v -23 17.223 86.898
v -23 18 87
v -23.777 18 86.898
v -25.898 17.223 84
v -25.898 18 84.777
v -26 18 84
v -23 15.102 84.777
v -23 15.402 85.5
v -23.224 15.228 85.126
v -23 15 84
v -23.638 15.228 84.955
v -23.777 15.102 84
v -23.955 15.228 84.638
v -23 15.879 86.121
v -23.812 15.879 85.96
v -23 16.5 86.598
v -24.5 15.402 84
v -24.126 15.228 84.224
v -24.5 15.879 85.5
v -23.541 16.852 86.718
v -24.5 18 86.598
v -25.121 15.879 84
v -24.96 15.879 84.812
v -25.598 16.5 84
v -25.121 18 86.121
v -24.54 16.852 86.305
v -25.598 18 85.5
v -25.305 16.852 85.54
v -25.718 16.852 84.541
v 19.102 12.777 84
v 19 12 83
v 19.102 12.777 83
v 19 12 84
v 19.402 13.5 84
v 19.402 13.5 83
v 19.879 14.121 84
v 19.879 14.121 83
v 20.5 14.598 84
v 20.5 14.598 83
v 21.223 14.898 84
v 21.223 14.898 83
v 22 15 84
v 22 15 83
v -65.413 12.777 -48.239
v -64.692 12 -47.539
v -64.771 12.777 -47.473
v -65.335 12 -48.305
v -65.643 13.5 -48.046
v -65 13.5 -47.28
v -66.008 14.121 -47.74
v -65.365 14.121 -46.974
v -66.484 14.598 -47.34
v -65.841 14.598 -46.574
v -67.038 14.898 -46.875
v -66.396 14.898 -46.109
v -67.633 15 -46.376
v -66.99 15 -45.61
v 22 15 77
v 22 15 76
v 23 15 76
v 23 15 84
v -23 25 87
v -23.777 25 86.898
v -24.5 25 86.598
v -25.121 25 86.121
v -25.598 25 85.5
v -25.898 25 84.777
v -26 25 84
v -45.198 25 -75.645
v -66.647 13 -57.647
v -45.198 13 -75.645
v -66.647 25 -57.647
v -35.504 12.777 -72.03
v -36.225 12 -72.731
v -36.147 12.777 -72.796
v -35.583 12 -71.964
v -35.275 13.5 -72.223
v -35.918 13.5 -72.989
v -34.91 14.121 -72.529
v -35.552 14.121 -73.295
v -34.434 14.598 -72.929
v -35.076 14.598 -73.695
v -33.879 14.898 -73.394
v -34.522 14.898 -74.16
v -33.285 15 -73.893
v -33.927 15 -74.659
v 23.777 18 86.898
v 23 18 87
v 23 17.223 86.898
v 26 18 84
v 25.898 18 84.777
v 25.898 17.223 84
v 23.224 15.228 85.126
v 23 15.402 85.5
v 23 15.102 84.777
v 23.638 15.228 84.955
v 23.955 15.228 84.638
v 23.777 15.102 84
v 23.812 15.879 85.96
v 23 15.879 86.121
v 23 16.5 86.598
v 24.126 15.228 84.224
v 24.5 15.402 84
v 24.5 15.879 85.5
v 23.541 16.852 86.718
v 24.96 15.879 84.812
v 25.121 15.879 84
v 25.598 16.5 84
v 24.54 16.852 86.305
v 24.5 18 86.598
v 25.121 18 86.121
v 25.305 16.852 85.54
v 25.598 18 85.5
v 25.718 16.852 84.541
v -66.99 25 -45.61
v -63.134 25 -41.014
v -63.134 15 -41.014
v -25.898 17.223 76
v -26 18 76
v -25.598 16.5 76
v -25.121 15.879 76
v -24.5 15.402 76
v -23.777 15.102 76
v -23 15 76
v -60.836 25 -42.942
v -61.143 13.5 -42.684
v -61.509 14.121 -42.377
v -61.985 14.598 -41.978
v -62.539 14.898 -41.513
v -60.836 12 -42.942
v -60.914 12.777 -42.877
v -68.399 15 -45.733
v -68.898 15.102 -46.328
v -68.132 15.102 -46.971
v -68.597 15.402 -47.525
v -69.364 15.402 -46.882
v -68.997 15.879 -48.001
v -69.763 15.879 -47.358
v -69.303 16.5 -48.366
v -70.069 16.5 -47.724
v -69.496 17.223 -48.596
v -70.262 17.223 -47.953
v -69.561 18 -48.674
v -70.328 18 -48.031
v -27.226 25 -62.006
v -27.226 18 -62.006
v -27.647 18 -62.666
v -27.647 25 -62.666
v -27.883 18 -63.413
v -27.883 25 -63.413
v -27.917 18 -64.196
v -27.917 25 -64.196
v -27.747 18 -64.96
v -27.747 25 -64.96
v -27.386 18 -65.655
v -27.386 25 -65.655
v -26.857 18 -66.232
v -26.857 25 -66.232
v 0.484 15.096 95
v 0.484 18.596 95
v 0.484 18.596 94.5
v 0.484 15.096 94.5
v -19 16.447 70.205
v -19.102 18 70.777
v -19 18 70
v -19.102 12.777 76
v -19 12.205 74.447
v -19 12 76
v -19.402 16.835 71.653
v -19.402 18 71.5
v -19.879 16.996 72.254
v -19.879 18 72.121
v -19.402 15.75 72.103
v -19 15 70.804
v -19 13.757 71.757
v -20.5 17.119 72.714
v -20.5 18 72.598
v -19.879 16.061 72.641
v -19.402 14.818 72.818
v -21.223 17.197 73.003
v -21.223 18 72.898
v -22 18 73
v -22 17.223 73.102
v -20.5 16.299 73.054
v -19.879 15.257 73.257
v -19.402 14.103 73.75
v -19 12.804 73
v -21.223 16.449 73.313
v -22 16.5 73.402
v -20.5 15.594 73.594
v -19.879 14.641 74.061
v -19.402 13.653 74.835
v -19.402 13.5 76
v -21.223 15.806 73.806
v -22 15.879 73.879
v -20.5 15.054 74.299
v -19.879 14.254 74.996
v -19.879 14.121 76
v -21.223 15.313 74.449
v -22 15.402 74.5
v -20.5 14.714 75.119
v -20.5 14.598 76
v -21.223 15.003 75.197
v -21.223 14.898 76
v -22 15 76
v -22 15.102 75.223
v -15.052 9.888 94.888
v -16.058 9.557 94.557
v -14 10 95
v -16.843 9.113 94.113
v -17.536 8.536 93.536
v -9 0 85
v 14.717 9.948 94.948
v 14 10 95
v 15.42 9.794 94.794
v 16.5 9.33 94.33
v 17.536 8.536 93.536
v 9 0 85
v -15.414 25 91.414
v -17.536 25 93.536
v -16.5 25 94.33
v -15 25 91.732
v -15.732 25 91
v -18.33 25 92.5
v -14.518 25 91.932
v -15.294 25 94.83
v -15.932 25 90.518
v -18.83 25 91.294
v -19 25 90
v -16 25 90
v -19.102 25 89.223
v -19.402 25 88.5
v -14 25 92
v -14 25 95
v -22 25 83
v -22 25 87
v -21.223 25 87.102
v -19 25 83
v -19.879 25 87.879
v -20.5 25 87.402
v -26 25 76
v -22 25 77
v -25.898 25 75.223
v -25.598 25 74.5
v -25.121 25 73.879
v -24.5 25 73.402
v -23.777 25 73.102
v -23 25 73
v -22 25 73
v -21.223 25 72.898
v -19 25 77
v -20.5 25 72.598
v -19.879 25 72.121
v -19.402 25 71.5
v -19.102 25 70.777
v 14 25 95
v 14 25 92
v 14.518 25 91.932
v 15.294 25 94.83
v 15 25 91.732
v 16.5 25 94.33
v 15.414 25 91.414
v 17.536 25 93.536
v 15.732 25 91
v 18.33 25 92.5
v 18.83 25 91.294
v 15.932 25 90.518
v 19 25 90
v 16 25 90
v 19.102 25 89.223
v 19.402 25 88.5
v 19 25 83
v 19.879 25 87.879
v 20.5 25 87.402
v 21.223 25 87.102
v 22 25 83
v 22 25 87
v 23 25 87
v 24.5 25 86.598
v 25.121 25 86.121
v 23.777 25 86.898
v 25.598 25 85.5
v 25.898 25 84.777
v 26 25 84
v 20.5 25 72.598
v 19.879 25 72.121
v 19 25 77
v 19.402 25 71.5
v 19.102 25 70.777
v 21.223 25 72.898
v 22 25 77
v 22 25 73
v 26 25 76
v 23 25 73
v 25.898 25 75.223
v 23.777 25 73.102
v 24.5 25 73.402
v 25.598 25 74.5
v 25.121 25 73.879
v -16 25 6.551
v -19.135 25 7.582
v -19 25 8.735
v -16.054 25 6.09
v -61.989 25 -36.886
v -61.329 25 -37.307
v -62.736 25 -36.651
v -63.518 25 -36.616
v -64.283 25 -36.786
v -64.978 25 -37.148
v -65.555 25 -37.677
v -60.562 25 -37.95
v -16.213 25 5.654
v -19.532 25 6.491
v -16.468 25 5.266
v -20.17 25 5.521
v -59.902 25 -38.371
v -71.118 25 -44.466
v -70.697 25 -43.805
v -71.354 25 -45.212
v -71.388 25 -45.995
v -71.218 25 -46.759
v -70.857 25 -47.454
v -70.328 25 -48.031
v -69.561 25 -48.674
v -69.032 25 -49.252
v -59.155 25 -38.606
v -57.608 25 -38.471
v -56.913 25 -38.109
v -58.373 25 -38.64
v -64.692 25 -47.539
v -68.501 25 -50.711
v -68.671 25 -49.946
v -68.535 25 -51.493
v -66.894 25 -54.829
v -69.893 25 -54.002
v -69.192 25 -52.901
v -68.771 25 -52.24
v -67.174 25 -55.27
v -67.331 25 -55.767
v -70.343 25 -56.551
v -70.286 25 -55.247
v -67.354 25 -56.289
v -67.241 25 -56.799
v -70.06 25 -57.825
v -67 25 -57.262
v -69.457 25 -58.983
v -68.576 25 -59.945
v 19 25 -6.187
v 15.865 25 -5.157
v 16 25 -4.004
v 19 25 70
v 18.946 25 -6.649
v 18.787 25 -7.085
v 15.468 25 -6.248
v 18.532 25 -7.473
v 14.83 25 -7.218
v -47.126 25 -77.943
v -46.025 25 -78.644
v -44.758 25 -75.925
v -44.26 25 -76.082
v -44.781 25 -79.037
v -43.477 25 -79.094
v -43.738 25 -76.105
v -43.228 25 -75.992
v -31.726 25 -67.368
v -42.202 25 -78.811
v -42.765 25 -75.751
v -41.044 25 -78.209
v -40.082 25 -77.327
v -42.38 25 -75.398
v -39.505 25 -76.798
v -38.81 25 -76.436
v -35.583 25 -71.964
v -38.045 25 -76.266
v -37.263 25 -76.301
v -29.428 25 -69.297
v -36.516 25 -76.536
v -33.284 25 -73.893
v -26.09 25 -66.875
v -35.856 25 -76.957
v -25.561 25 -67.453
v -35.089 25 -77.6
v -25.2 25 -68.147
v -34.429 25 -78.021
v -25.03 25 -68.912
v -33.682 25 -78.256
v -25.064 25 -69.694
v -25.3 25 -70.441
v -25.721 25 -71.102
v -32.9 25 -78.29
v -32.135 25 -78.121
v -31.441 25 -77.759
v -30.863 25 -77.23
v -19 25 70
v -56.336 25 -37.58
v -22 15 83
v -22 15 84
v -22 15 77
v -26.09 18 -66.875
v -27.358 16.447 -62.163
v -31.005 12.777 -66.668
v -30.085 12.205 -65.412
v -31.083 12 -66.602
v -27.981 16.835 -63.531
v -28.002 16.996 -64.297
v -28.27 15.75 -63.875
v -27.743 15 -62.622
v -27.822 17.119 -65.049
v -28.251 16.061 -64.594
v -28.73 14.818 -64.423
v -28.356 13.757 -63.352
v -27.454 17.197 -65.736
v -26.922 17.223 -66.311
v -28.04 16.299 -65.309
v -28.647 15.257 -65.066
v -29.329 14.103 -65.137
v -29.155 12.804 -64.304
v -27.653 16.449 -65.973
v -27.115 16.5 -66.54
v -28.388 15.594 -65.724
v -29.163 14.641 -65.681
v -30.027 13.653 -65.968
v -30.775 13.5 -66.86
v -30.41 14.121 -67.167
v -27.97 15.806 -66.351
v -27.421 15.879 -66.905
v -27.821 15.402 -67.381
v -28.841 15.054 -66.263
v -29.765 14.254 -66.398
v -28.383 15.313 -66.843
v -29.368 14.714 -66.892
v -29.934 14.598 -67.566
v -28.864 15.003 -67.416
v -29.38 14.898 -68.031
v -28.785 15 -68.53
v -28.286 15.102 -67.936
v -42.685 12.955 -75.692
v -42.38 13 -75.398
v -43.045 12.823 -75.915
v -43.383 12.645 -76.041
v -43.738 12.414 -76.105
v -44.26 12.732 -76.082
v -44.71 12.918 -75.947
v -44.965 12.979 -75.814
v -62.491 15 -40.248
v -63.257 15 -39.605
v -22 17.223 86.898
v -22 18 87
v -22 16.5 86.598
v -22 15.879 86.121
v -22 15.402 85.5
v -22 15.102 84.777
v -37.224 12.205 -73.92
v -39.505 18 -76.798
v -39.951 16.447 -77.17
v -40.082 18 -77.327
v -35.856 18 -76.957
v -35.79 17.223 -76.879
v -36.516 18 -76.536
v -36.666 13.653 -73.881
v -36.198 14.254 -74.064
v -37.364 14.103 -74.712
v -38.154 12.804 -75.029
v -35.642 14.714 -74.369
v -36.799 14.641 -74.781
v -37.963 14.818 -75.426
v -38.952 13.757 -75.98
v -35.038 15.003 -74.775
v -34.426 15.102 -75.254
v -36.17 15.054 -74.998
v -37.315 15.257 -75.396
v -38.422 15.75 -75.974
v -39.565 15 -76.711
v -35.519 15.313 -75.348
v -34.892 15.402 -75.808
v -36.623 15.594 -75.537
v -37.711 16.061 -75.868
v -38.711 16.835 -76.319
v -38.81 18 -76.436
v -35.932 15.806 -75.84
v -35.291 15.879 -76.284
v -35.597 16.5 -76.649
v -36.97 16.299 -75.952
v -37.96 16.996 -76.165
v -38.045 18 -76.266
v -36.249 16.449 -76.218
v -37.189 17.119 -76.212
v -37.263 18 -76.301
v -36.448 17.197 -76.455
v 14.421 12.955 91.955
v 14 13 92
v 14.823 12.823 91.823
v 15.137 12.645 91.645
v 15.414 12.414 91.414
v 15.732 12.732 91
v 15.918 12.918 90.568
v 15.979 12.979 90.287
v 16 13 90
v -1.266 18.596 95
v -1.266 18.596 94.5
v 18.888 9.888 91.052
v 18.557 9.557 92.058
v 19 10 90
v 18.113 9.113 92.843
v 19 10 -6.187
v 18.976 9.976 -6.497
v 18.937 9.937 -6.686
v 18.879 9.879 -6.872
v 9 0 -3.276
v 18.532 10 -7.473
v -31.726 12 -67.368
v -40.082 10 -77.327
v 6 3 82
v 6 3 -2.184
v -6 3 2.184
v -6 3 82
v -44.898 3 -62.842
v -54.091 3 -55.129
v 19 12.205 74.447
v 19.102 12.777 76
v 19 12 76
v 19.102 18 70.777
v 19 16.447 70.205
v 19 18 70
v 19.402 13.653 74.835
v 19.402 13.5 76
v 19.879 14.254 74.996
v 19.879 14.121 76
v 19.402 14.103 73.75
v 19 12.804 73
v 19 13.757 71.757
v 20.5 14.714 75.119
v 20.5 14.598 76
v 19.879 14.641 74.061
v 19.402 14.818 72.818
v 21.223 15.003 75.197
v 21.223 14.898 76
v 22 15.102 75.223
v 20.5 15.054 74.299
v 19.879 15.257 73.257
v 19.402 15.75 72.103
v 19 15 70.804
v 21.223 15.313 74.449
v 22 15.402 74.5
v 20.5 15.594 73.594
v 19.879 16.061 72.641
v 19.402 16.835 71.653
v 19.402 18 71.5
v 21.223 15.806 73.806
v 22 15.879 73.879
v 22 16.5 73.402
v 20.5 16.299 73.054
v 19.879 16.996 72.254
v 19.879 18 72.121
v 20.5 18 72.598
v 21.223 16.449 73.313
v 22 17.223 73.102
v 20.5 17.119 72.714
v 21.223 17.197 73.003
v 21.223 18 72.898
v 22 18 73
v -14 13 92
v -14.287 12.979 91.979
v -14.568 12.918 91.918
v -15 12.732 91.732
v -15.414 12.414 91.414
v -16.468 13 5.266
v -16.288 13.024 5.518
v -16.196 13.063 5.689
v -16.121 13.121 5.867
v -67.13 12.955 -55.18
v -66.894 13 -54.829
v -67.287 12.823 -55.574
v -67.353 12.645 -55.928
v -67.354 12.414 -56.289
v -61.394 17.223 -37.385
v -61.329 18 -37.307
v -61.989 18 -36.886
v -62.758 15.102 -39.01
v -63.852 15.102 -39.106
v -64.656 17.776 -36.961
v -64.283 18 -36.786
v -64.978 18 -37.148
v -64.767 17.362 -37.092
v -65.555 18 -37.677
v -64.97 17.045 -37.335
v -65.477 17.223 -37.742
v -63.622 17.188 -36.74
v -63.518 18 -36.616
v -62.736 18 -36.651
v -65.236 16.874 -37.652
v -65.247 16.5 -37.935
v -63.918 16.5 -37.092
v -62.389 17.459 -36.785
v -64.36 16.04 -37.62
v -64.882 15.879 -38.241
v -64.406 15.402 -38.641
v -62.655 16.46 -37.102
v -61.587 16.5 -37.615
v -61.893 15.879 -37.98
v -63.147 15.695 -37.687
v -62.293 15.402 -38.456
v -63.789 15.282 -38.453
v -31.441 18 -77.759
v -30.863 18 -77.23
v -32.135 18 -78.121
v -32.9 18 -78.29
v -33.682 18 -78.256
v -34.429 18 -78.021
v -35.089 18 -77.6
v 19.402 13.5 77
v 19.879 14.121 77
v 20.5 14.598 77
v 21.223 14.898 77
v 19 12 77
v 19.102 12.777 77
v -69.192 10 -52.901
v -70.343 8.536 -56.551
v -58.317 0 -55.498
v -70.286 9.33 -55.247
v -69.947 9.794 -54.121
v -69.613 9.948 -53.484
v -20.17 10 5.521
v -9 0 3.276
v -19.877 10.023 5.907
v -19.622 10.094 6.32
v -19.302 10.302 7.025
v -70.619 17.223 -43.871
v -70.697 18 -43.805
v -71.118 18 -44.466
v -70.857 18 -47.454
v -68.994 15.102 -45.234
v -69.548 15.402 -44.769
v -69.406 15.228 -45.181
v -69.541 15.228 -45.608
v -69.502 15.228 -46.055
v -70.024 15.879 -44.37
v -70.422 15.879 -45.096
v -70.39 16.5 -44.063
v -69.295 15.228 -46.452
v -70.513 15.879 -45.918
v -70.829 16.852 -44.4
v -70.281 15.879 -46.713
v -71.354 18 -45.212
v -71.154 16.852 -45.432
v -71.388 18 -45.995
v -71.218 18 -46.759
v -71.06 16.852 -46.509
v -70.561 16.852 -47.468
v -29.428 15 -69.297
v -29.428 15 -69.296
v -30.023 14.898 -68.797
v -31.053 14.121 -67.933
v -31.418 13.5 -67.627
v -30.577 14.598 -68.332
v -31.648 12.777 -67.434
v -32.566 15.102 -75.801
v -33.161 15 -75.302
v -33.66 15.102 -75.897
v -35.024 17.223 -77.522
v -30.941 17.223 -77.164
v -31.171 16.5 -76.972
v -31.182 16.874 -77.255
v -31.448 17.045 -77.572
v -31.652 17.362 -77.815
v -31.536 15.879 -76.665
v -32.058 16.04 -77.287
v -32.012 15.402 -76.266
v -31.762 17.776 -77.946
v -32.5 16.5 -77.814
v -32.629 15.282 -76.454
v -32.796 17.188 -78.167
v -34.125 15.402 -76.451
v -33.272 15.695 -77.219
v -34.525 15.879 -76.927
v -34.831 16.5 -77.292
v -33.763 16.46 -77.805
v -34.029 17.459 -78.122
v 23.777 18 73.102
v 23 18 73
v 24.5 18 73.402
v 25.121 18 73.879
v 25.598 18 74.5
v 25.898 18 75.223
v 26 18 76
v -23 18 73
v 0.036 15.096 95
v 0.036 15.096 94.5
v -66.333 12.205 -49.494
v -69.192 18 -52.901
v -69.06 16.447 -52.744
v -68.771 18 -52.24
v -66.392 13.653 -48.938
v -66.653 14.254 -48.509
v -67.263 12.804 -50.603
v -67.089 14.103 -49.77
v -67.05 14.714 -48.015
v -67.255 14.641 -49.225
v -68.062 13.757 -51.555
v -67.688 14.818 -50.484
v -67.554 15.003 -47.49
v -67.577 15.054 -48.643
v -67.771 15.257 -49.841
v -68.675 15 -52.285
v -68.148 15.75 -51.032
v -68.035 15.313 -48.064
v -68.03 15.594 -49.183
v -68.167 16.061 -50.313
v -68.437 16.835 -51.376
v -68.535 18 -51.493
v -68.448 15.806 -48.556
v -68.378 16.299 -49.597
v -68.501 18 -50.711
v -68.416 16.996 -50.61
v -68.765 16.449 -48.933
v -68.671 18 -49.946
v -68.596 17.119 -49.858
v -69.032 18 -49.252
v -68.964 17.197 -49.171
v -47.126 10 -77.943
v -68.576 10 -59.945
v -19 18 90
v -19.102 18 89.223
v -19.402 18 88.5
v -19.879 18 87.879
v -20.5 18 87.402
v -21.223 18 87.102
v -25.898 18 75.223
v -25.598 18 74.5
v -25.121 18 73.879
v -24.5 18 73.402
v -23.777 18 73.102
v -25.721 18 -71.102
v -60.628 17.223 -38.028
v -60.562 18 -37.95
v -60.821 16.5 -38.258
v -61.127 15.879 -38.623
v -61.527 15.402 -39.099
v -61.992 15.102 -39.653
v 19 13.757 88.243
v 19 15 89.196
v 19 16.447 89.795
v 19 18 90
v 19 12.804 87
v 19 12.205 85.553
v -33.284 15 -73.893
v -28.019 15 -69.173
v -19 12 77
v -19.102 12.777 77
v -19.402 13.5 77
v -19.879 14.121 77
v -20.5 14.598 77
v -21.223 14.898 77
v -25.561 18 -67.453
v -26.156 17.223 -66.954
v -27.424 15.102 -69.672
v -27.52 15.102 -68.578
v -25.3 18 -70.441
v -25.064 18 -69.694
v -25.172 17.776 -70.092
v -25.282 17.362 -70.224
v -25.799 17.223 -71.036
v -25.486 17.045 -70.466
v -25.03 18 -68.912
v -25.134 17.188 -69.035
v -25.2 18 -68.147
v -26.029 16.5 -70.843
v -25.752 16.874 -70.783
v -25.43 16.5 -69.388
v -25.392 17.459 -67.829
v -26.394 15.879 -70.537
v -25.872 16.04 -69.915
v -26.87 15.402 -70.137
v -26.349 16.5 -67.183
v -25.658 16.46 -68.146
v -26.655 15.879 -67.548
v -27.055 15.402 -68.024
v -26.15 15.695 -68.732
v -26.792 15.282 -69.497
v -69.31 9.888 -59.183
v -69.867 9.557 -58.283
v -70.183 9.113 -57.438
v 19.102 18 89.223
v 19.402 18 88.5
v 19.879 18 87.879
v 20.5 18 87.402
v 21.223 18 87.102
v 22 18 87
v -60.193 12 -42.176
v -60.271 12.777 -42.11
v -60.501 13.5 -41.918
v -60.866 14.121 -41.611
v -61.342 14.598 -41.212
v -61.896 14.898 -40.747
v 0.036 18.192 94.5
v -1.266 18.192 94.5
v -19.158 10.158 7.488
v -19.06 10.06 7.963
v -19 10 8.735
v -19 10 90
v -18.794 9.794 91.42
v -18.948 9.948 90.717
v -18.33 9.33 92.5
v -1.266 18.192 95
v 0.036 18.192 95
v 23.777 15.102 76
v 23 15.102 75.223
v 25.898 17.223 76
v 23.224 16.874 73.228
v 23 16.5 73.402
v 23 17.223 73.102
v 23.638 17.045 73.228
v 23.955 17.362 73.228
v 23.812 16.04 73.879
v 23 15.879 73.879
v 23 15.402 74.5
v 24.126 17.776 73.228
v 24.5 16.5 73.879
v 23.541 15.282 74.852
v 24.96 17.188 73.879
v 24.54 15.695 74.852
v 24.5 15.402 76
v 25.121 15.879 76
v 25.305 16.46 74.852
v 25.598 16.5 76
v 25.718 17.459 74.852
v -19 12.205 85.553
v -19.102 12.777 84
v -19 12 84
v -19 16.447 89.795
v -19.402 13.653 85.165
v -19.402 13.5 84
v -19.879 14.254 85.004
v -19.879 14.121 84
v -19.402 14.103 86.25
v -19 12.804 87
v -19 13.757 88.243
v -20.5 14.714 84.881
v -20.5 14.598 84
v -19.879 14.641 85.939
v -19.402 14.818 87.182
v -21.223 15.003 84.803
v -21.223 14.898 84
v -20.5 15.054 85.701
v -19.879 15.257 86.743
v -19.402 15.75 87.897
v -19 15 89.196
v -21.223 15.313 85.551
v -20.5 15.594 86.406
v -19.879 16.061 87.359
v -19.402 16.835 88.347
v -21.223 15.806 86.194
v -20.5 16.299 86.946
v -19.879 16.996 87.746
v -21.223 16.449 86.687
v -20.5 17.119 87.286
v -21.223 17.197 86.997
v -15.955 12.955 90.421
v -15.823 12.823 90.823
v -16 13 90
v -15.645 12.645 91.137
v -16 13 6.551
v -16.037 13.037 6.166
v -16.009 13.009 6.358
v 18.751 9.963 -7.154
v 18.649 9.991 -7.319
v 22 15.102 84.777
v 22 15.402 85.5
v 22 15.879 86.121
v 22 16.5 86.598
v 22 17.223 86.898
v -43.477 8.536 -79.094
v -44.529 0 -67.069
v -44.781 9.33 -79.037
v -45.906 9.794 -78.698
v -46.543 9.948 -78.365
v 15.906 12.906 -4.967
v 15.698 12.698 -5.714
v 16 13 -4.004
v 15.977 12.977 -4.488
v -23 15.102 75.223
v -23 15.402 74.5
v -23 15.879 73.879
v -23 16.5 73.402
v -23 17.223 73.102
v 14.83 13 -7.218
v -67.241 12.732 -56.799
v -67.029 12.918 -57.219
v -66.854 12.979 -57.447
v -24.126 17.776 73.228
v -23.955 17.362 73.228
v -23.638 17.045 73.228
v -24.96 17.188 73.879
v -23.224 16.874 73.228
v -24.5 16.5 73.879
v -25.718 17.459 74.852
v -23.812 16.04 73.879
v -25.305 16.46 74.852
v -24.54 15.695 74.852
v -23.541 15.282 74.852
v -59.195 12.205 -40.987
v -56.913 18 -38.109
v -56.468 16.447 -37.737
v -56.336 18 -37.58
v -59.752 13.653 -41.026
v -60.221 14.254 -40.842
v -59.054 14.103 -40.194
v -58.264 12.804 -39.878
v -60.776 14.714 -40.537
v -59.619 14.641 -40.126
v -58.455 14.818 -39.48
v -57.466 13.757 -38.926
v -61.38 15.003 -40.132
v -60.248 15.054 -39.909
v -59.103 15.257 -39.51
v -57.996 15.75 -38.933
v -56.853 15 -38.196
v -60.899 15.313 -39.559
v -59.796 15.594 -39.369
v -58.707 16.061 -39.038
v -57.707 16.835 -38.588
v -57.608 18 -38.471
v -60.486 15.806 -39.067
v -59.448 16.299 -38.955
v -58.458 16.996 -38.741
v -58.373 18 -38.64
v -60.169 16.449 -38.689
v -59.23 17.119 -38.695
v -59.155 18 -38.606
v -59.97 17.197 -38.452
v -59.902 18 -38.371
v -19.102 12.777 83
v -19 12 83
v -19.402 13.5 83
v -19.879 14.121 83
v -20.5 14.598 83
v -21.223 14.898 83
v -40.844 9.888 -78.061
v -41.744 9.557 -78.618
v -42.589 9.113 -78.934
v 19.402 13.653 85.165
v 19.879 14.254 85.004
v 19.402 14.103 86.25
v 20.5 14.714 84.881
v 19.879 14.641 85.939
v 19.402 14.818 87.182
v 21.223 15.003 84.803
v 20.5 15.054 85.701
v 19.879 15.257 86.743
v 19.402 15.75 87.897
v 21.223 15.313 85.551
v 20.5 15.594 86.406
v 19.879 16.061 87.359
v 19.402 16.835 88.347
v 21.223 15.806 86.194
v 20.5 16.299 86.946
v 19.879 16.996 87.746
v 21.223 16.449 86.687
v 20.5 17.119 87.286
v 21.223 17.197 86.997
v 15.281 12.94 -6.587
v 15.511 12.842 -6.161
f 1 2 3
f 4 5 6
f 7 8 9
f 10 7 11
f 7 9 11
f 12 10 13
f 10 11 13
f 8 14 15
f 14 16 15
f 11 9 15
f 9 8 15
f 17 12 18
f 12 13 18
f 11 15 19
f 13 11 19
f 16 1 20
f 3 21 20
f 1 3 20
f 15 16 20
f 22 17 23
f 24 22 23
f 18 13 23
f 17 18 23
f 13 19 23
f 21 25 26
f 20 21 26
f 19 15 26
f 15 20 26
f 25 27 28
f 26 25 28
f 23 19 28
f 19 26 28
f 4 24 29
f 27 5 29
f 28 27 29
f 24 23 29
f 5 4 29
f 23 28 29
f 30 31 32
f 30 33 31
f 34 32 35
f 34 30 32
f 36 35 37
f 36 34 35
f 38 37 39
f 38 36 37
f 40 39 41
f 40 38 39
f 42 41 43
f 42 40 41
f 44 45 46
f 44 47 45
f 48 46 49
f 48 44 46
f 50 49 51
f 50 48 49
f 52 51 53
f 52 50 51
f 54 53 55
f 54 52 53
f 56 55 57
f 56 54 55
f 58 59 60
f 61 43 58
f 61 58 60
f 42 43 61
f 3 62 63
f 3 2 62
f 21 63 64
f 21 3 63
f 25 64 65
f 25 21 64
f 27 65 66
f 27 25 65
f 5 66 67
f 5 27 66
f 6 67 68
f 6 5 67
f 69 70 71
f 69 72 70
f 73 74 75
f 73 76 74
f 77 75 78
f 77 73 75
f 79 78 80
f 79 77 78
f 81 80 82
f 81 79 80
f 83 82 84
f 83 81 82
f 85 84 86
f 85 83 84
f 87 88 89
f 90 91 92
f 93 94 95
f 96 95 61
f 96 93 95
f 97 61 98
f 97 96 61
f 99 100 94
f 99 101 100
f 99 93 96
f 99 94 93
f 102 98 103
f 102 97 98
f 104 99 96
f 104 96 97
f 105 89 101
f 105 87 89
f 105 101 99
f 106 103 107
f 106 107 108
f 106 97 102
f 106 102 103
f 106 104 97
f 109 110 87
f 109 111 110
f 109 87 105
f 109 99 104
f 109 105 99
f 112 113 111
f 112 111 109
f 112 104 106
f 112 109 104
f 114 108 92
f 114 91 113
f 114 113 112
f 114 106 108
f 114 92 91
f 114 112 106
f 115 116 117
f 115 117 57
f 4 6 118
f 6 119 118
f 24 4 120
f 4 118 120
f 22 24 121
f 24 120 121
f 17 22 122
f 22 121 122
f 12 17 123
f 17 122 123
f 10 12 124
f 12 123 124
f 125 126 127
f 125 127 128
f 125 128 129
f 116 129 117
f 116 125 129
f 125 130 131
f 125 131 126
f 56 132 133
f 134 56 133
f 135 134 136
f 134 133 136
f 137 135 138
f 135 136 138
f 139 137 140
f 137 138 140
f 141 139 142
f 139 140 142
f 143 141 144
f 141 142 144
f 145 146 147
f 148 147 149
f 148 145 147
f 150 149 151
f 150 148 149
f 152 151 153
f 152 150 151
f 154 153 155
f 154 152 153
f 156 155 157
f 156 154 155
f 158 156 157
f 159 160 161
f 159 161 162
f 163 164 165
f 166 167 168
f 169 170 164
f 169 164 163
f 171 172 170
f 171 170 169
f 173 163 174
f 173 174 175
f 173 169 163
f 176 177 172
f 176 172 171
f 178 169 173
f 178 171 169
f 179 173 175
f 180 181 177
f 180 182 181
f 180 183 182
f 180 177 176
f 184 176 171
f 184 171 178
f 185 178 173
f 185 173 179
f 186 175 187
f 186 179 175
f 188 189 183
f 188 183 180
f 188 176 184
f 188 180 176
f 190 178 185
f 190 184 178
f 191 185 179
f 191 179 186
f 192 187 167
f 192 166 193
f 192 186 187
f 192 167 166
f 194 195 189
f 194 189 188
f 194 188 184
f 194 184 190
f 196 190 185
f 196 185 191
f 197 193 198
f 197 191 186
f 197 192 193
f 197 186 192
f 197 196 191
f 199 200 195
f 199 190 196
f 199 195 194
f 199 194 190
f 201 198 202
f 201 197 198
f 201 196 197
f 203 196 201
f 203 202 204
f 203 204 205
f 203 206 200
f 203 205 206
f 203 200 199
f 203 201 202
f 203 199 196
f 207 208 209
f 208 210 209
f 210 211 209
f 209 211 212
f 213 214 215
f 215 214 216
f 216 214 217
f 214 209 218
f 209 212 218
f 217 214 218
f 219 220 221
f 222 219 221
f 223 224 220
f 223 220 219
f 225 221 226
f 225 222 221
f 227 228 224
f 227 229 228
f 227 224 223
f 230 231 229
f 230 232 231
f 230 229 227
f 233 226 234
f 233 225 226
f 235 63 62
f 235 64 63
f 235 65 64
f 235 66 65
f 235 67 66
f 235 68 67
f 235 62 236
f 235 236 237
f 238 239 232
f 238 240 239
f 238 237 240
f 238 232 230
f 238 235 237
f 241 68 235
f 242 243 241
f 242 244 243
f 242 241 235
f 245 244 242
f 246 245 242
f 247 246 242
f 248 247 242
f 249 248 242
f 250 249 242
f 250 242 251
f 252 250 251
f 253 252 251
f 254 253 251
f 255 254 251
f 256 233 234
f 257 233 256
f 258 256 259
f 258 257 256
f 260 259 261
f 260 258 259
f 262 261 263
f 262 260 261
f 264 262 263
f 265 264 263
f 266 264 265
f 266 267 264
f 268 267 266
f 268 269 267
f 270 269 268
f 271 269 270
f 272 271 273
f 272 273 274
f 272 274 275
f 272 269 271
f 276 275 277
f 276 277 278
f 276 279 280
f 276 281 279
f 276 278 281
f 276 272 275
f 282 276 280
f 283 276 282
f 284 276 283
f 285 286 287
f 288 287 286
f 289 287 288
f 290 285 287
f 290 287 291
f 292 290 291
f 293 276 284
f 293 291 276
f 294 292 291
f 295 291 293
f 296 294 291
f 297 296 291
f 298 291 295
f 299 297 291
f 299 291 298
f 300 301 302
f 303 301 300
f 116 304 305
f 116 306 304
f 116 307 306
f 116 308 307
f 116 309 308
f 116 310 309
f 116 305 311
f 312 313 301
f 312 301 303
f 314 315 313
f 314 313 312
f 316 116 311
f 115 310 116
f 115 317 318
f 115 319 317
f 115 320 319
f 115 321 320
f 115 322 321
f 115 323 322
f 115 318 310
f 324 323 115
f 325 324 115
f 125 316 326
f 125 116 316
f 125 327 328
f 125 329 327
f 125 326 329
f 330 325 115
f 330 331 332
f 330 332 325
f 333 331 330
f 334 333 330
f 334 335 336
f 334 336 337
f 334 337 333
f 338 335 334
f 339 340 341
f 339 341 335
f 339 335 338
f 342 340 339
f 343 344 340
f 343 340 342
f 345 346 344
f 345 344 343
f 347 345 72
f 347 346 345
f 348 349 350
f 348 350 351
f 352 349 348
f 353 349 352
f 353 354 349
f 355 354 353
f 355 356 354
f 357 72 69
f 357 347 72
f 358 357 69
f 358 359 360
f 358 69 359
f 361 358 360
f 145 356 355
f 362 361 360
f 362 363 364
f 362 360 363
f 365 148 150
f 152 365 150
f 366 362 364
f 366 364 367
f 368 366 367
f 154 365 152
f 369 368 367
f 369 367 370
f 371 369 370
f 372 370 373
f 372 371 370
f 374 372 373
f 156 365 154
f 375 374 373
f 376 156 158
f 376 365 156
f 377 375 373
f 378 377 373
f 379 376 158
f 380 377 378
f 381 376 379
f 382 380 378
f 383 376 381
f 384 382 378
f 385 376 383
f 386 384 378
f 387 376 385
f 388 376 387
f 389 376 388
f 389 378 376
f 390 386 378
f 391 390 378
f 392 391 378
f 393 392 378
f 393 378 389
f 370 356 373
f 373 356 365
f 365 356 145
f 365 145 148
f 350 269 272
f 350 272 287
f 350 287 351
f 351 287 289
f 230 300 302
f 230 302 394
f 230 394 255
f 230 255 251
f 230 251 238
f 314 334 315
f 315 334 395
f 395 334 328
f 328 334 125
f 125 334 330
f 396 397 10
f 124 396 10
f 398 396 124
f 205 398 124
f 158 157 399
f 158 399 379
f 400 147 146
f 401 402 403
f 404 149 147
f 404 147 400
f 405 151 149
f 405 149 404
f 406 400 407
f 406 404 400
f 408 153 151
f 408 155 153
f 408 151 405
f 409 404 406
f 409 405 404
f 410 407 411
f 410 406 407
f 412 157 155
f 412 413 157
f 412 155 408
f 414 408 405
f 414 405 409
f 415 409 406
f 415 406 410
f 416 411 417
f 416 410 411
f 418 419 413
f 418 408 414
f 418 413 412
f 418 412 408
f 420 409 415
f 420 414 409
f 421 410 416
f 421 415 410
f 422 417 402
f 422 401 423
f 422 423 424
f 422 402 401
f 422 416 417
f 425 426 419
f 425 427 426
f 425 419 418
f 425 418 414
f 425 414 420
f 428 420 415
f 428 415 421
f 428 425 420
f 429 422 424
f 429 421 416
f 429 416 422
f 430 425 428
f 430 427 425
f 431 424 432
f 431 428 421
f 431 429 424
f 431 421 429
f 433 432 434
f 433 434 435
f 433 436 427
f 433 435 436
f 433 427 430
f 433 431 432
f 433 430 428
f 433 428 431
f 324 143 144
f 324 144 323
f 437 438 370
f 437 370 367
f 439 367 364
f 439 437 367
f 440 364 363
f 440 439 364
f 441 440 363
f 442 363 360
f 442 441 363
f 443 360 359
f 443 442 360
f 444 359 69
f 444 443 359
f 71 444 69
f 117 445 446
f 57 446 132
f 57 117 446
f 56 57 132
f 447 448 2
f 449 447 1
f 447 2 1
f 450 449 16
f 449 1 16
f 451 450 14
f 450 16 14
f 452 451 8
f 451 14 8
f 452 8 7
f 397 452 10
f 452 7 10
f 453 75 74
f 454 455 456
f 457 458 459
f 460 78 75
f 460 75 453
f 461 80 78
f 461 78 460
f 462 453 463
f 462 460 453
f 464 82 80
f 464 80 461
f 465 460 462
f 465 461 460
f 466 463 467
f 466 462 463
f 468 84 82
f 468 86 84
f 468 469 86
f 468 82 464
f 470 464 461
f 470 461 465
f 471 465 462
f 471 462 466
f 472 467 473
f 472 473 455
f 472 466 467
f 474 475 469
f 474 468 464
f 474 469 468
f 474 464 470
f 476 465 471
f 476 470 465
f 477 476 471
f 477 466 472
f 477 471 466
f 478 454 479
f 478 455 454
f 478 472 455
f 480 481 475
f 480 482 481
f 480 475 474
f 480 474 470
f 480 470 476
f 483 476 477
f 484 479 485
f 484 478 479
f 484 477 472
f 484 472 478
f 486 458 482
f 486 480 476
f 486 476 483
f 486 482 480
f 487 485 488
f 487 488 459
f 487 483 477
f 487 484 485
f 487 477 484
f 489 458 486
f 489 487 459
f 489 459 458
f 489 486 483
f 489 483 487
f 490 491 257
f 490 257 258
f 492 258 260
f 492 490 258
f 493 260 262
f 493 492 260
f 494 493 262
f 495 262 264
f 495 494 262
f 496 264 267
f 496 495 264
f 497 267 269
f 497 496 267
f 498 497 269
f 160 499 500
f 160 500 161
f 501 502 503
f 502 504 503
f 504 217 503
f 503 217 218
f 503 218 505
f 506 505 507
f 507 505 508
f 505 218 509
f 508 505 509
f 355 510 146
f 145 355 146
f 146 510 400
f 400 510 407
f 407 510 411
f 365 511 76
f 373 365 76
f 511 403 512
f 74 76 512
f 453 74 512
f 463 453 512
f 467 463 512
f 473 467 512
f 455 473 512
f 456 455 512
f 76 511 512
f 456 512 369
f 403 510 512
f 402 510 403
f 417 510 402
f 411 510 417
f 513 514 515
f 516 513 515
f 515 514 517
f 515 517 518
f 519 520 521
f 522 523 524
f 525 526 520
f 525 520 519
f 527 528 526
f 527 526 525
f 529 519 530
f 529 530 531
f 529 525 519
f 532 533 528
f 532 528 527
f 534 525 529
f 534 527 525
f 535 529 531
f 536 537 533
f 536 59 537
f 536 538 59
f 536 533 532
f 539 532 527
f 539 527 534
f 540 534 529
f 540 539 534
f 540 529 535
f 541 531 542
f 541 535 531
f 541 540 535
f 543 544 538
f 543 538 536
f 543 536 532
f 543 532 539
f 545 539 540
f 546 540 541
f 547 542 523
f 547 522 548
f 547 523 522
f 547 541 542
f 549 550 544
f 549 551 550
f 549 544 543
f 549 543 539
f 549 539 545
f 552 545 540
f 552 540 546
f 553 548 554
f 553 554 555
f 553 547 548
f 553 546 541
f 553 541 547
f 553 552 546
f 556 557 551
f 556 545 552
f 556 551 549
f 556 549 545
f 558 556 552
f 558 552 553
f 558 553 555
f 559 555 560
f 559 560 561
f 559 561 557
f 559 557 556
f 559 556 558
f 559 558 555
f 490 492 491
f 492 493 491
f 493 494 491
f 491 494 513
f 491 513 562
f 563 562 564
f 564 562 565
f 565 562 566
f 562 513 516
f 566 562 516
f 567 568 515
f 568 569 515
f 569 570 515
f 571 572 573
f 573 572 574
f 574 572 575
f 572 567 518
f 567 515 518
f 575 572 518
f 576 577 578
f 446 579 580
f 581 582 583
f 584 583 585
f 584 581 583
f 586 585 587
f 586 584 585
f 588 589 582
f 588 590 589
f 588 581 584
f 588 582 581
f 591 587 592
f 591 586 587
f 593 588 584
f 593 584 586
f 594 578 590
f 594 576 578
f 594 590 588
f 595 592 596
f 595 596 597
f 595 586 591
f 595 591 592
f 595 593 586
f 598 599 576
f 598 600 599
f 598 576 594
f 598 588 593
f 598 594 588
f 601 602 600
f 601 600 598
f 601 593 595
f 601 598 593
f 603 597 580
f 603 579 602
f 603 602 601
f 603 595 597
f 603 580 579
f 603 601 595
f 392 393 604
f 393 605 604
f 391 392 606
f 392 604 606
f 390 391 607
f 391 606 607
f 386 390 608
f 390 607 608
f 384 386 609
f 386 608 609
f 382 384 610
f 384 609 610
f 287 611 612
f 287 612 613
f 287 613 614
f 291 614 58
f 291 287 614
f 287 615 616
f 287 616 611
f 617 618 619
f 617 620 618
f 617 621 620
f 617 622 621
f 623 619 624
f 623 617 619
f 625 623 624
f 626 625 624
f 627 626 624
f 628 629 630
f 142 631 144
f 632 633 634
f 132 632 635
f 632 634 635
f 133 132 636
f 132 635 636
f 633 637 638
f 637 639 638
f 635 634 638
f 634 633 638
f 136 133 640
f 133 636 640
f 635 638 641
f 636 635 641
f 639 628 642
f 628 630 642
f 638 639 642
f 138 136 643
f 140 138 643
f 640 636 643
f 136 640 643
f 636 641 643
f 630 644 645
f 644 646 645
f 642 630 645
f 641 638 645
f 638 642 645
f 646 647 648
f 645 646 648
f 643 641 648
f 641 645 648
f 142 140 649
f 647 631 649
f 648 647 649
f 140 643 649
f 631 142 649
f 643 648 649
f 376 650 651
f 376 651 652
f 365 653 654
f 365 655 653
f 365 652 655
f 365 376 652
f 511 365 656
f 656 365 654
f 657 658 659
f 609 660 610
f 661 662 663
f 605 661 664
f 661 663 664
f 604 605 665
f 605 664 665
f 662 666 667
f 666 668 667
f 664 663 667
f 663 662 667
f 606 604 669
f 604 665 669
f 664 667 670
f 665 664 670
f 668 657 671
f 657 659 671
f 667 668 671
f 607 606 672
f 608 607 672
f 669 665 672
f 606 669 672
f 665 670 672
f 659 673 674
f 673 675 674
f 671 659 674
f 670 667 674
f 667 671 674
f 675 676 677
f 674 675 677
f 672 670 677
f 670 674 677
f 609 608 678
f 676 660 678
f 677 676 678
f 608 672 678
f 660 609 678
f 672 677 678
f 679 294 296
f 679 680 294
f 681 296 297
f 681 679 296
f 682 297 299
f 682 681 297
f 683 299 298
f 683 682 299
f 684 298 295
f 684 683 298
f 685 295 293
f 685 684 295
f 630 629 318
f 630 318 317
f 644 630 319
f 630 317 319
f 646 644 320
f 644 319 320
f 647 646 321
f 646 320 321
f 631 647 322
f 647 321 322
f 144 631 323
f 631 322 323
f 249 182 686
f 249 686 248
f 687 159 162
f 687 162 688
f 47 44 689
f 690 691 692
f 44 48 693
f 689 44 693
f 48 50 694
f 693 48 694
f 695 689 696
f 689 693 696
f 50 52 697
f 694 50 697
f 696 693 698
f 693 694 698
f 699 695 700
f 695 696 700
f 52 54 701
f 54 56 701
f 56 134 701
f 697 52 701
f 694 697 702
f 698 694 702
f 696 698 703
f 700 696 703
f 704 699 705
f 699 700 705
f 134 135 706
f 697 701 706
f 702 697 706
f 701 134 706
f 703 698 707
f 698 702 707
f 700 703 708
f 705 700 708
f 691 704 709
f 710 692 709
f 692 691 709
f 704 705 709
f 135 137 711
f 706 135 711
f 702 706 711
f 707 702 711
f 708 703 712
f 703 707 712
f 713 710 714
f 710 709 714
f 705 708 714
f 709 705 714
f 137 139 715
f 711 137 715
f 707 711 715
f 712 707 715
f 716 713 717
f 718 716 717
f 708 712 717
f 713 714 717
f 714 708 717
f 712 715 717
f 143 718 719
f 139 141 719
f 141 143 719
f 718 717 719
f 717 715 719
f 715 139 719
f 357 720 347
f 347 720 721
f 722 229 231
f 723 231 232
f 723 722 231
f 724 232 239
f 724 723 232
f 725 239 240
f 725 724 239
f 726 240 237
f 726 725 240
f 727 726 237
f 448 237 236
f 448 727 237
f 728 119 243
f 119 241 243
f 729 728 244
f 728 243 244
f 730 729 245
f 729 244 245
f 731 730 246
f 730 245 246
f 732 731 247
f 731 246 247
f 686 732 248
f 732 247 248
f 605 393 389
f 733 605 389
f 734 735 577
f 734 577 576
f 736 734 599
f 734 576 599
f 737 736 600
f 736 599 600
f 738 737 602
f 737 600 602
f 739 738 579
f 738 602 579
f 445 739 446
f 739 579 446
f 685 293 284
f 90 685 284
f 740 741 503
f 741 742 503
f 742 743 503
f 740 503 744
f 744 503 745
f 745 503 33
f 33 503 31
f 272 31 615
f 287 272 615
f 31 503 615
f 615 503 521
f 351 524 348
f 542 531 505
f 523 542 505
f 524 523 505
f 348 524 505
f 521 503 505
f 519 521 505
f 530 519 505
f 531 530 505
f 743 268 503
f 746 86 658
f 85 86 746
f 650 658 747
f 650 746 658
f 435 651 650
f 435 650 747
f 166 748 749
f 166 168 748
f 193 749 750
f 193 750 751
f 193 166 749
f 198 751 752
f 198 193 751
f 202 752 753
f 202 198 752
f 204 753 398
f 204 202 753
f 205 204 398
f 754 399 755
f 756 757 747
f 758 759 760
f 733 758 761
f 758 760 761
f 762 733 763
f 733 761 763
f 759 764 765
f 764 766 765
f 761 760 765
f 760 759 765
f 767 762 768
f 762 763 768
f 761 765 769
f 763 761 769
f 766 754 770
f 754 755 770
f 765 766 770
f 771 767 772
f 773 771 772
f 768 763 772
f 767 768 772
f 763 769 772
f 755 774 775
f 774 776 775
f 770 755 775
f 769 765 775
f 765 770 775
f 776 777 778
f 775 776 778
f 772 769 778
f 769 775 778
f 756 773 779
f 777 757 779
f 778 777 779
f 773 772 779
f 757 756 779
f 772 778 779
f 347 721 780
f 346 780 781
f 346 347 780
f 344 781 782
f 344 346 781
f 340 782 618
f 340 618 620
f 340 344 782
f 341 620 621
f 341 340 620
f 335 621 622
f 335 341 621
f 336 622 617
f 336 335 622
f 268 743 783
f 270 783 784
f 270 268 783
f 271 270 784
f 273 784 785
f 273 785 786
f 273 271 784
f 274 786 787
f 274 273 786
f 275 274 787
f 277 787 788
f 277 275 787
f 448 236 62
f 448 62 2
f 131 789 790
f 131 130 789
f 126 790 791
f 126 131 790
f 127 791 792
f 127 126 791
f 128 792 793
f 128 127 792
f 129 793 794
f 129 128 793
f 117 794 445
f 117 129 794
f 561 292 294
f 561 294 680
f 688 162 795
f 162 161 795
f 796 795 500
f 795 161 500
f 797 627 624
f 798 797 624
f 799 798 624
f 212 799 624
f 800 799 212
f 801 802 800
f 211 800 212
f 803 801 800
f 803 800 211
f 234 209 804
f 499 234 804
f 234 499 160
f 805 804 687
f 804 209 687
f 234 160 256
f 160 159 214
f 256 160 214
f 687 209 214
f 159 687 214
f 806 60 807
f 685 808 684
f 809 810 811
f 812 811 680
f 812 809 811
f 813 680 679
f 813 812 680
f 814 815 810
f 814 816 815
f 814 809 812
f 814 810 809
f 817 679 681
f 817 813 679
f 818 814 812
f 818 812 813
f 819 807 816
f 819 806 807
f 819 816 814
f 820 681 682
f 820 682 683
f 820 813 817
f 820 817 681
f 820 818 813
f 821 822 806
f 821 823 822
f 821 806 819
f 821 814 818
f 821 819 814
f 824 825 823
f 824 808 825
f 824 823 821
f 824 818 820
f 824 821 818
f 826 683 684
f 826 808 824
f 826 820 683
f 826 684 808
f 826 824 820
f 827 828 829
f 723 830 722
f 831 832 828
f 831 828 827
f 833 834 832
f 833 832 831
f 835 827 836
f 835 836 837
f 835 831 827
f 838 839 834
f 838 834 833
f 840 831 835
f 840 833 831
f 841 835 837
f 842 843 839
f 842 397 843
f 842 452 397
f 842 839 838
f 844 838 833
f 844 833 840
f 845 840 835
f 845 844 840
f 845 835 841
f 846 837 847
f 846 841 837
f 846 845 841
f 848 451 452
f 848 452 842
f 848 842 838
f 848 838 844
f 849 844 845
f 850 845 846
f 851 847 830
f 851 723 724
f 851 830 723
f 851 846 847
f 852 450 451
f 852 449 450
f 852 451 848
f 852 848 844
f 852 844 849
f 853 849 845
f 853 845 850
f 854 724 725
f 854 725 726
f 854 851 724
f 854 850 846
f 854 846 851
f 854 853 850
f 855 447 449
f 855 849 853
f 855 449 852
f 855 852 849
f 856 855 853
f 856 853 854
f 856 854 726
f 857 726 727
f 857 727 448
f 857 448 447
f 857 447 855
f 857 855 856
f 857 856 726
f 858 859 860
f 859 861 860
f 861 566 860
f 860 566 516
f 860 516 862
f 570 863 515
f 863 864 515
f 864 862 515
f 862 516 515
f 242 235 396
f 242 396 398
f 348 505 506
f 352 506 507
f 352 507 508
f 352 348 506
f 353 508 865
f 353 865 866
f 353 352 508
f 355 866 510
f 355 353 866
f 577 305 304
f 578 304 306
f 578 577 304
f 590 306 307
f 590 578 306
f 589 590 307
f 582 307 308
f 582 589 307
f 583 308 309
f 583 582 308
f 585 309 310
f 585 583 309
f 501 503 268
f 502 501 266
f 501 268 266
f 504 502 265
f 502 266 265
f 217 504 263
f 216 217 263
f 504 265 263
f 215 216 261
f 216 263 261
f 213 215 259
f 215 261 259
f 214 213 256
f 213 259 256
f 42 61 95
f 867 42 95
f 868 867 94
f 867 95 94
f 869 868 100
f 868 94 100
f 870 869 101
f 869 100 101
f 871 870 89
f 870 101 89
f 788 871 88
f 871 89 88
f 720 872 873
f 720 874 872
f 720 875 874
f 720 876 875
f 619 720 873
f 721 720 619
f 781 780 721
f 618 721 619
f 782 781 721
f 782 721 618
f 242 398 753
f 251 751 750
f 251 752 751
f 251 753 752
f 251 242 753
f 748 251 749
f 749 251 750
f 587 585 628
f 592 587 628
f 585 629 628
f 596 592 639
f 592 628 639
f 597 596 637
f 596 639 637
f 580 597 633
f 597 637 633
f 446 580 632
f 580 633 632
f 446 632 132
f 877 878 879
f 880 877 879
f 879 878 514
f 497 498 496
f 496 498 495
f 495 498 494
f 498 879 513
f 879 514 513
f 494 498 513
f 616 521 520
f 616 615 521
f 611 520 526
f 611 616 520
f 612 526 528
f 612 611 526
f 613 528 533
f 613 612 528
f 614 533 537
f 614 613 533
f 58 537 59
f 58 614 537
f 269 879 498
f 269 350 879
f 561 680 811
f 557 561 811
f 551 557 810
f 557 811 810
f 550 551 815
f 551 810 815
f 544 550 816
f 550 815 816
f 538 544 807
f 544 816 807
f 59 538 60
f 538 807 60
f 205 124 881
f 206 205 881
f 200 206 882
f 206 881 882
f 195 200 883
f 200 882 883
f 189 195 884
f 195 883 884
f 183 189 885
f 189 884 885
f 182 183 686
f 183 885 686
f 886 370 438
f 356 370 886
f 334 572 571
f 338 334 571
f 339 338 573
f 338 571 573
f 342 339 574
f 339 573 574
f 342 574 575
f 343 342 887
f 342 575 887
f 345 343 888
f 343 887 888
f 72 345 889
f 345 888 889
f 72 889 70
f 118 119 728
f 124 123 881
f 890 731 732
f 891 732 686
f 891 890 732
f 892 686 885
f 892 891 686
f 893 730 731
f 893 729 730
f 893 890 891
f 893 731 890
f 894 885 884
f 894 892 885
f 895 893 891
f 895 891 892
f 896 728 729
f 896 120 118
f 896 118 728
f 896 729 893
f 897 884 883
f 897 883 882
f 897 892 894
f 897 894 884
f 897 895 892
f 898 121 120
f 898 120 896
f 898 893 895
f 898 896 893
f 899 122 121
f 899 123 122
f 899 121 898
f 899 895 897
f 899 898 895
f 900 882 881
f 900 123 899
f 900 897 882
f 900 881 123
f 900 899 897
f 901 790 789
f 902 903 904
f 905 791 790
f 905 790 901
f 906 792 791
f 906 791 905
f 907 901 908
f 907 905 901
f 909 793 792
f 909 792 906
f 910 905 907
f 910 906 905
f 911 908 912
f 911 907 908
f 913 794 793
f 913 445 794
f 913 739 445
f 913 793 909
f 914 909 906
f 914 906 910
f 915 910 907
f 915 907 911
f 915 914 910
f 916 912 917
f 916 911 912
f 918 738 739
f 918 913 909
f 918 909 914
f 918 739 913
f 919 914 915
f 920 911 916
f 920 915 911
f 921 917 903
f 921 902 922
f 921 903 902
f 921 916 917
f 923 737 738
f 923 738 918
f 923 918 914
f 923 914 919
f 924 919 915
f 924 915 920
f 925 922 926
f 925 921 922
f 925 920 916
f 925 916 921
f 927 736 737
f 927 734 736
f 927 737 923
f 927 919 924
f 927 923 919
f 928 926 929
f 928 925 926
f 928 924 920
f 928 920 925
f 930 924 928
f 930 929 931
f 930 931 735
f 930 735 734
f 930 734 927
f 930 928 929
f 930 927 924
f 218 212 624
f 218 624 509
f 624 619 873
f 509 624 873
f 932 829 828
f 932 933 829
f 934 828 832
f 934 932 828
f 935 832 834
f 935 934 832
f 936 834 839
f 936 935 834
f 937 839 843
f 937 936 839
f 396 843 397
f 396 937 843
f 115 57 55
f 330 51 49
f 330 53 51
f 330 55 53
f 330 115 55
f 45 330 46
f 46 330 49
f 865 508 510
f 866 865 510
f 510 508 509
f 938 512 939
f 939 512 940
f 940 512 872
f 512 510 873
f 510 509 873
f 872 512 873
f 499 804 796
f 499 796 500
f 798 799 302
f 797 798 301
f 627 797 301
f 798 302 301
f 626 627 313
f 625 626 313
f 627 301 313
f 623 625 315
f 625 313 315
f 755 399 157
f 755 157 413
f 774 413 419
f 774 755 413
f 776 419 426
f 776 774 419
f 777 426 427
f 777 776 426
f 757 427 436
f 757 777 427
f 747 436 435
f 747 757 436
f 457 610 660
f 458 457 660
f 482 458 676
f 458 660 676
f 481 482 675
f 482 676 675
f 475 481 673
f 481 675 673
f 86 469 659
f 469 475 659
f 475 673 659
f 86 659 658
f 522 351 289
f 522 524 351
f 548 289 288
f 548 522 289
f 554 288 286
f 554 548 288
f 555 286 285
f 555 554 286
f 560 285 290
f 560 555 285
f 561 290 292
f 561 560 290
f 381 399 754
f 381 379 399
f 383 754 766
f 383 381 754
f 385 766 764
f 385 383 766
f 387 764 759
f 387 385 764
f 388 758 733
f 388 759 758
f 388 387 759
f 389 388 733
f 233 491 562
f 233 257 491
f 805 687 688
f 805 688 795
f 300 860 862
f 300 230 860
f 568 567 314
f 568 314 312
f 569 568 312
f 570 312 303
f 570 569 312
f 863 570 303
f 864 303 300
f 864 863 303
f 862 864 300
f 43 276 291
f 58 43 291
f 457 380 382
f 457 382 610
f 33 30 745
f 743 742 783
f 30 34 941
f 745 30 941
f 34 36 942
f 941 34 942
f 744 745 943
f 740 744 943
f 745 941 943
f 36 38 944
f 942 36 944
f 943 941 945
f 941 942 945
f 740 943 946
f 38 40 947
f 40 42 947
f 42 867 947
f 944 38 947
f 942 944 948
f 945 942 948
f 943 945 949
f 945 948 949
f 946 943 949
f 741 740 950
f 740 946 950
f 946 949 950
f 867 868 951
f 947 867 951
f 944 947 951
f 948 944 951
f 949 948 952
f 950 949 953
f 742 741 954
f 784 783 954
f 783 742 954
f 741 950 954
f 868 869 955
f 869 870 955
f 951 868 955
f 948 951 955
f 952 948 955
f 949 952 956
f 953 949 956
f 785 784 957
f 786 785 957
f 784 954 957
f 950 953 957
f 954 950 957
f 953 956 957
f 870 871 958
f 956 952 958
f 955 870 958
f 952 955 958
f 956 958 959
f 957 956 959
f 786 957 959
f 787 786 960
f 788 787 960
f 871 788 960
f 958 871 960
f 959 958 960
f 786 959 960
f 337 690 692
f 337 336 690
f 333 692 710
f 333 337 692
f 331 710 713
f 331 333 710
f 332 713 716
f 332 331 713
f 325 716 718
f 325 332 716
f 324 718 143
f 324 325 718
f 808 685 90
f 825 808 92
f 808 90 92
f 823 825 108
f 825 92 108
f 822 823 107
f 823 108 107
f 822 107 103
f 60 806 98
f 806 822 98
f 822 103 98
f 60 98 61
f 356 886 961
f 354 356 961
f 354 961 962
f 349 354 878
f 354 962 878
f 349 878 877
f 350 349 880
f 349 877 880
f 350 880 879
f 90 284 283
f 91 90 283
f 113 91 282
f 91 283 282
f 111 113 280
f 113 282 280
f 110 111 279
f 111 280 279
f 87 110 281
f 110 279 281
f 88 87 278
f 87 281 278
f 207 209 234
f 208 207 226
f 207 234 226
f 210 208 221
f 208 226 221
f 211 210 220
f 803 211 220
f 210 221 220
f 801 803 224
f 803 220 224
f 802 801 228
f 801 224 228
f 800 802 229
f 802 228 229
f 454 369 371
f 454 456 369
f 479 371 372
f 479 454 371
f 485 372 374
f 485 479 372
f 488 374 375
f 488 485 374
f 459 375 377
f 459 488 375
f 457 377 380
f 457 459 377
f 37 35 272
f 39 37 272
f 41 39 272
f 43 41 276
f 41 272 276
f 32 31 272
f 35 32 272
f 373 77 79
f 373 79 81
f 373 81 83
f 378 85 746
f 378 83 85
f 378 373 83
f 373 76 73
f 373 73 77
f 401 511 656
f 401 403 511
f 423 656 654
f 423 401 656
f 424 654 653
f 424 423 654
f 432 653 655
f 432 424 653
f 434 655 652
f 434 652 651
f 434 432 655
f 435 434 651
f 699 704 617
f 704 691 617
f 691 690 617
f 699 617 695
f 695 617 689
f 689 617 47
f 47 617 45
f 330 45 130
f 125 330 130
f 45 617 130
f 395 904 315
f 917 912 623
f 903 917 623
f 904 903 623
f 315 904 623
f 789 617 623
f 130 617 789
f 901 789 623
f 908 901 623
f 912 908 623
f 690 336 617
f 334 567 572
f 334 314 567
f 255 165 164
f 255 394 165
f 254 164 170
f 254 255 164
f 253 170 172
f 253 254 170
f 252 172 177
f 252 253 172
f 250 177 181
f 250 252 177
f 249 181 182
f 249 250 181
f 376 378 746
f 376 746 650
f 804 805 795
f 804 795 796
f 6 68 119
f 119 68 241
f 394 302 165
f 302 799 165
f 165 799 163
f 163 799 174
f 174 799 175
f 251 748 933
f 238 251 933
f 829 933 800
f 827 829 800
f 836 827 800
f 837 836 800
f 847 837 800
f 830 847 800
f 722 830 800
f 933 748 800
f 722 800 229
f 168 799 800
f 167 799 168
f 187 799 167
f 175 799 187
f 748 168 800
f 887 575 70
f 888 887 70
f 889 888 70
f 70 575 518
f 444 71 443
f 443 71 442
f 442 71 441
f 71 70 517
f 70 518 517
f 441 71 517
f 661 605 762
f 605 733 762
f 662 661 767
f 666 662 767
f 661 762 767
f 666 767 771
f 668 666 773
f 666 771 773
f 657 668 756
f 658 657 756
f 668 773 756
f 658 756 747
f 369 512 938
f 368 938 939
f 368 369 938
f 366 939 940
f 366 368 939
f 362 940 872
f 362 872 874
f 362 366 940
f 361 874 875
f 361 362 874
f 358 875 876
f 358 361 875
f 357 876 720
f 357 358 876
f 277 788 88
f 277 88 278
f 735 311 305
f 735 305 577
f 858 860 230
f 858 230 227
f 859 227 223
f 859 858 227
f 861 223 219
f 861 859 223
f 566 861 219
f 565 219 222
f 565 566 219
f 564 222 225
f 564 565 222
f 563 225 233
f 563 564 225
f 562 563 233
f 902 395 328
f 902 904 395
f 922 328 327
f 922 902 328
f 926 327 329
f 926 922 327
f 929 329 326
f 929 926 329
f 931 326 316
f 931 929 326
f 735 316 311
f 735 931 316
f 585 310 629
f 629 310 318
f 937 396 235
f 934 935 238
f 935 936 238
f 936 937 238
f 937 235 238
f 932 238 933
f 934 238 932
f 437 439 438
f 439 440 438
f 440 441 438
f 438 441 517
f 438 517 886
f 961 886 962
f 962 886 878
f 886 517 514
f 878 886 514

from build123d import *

# Parameters (mm, degrees)
BOSS_EXTRUDE1_DEPTH = 25
CUT_EXTRUDE1_DEPTH  = 22
CHAMFER1_SIZE       = 10
FILLET1_R           = 2
FILLET2_R           = 5
CUT_EXTRUDE4_DEPTH  = 0.5
BOSS_EXTRUDE2_DEPTH = 7
BOSS_EXTRUDE3_DEPTH = 7
BOSS_EXTRUDE4_DEPTH = 7
BOSS_EXTRUDE5_DEPTH = 7
SKETCH10_W          = 3
SKETCH10_H          = 6
CUT_EXTRUDE5_DEPTH  = 123.16586282655703
FILLET3_R           = 3


with BuildPart() as part:
    # Sketch1 → Boss-Extrude1 (new body)
    with BuildSketch(Plane(origin=(0, 0, 0), x_dir=(1, 0, 0), z_dir=(0, 1, 0))):
        Polygon((19, -95), (19, 6.9154344510577115), (-43.296040452526896, 81.15696446475283), (-72.40572929104839, 56.73103529666472), (-18.999999999999996, -6.915434451057793), (-19, -95), align=None)
    extrude(amount=BOSS_EXTRUDE1_DEPTH)

    # Sketch2 → Cut-Extrude1 (cut)
    with BuildSketch(Plane(origin=(0, 25, 0), x_dir=(1, 0, 0), z_dir=(0, 1, 0))):
        Polygon((-68.17923313263185, 56.36126479636737), (-43.66581095282428, 76.93046830633632), (16, 5.823523748259106), (16.00000000000001, -92), (-15.99999999999999, -92), (-15.999999999999996, -5.823523748259207), align=None)
    extrude(amount=-CUT_EXTRUDE1_DEPTH, mode=Mode.SUBTRACT)

    # Chamfer1
    chamfer1_edges = [part.edges().sort_by_distance(p)[0] for p in [
        (-42.089616566315925, 3, -25.26887052405408),
        (-55.92252204272806, 3, -66.64586655135184),
        (-13.83290547641214, 3, -41.376996027297714),
        (16.000000000000007, 3, 43.08823812587045),
        (1.066e-14, 3, 92),
        (-15.999999999999993, 3, 48.9117618741296),
        (-18.999999999999996, 0, 50.957717225528896),
        (-45.7028646455242, 0, -24.90780042280347),
        (-57.85088487178764, 0, -68.94399988070877),
        (-12.148020226263444, 0, -44.036199457905276),
        (19, 0, 44.04228277447115),
        (0, 0, 95),
    ]]
    chamfer(chamfer1_edges, length=CHAMFER1_SIZE)

    # Fillet1
    fillet1_edges = [part.edges().sort_by_distance(p)[0] for p in [
        (19, 17.5, -6.9154344510577115),
        (-68.17923313263185, 19, -56.36126479636737),
        (-43.66581095282428, 19, -76.93046830633632),
        (16.00000000000001, 19, 92),
        (-15.99999999999999, 19, 92),
        (-15.999999999999996, 19, 5.823523748259207),
    ]]
    fillet(fillet1_edges, radius=FILLET1_R)

    # Fillet2
    fillet2_edges = [part.edges().sort_by_distance(p)[0] for p in [
        (-19, 17.5, 95),
        (-18.999999999999996, 17.5, 6.915434451057793),
        (-72.40572929104839, 17.5, -56.73103529666472),
        (-43.296040452526896, 17.5, -81.15696446475283),
        (19, 17.5, 95),
        (16, 19, -5.823523748259106),
    ]]
    fillet(fillet2_edges, radius=FILLET2_R)

    # Sketch9 → Cut-Extrude4 (cut)
    with BuildSketch(Plane.XY.offset(95)):
        Polygon((0.4844994416495535, 15.096060671986343), (0.03578149293160474, 15.096060671986343), (0.03578149293160474, 18.19221451814019), (-1.2655005583504468, 18.19221451814019), (-1.2655005583504468, 18.596060671986343), (0.4844994416495535, 18.596060671986343), align=None)
    extrude(amount=-CUT_EXTRUDE4_DEPTH, mode=Mode.SUBTRACT)

    # Sketch3 → Boss-Extrude2 (add)
    with BuildSketch(Plane(origin=(-14.554844419260807, 0, 12.212964584044096), x_dir=(0.6427876096865288, 0, 0.766044443118987), z_dir=(-0.766044443118987, 0, 0.6427876096865288))):
        Polygon((-68, 15.000000000000004), (-82.00000000000001, 15.000000000000002), (-82.00000000000001, 25), (-68.00000000000001, 25), align=None)
    extrude(amount=BOSS_EXTRUDE2_DEPTH)

    # Sketch4 → Boss-Extrude3 (add)
    with BuildSketch(Plane(origin=(14.554844419260744, 0, -12.212964584044062), x_dir=(-0.6427876096865294, 0, -0.7660444431189866), z_dir=(0.7660444431189866, 0, -0.6427876096865294))):
        Polygon((82.00000000000001, 15.000000000000002), (68.00000000000001, 14.999999999999998), (68.00000000000001, 25), (82.00000000000001, 25), align=None)
    extrude(amount=BOSS_EXTRUDE3_DEPTH)

    # Sketch6 → Boss-Extrude4 (add)
    with BuildSketch(Plane.ZY.offset(18.999999999999996)):
        Polygon((87, 15.000000000000002), (73, 15), (72.99999999999999, 25), (87, 25), align=None)
    extrude(amount=BOSS_EXTRUDE4_DEPTH)

    # Sketch7 → Boss-Extrude5 (add)
    with BuildSketch(Plane(origin=(19, 0, 0), x_dir=(0, 0, -1), z_dir=(1, 0, 0))):
        Polygon((-73, 15.000000000000004), (-87, 15.000000000000002), (-87, 25), (-73, 25), align=None)
    extrude(amount=BOSS_EXTRUDE5_DEPTH)

    # Sketch10 → Cut-Extrude5 (cut, through all)
    with BuildSketch(Plane(origin=(0, 25, 0), x_dir=(1, 0, 0), z_dir=(0, 1, 0))):
        Polygon((-66.99041130416701, 45.61013915017732), (-64.69227797481005, 47.53850197923691), (-60.83555231669091, 42.942235320523), (-63.13368564604784, 41.013872491463395), align=None)
        Polygon((-35.582589136288576, 71.96443114732502), (-33.28445580693161, 73.8927939763846), (-29.427730148812422, 69.29652731767068), (-31.725863478169394, 67.3681644886111), align=None)
        with Locations((-20.499999999999996, -79.99999999999999)):
            Rectangle(SKETCH10_W, SKETCH10_H)
        with Locations((20.5, -80)):
            Rectangle(SKETCH10_W, SKETCH10_H)
    extrude(amount=-CUT_EXTRUDE5_DEPTH, mode=Mode.SUBTRACT)

    # Fillet3
    fillet3_edges = [part.edges().sort_by_distance(p)[0] for p in [
        (-58.26440187794476, 20, -39.878057548047025),
        (-65.97785319418313, 15.000000000000002, -49.07059086547488),
        (19, 20, 87),
        (19, 15.000000000000004, 75),
        (-18.999999999999996, 20, 87),
        (-18.999999999999996, 20, 73),
        (-29.154713039423243, 20, -64.30398671613516),
        (-38.153739575034656, 20, -75.02860891980096),
        (-60.94555742886122, 15.000000000000004, -37.62830091414418),
        (-59.549977097317836, 15.000000000000004, -41.410146434285004),
        (-63.62671297977768, 20, -35.37854428024132),
        (-67.26342841355618, 20, -50.60267975171285),
        (-72.62573951538909, 20, -46.103166483907145),
        (-68.12622624758338, 15.000000000000004, -40.74085538207423),
        (-69.94458396447264, 15.000000000000002, -48.35292311781),
        (26, 20, 87),
        (22.5, 15.000000000000002, 87),
        (19, 15.000000000000002, 85),
        (26, 15.000000000000004, 80),
        (19, 20, 73),
        (22.5, 15.000000000000004, 73),
        (26, 20, 73),
        (-25.999999999999996, 20, 87),
        (-22.499999999999996, 15.000000000000002, 87),
        (-18.999999999999996, 15.000000000000002, 85),
        (-18.999999999999996, 15, 75),
        (-25.999999999999996, 15, 80),
        (-25.999999999999996, 20, 73),
        (-22.499999999999996, 15, 73),
        (-30.440288258796315, 14.999999999999998, -65.83607560237314),
        (-26.47355748850679, 14.999999999999998, -66.553743350038),
        (-23.792401937590338, 20, -68.80349998394087),
        (-35.472584024118206, 15.000000000000002, -77.27836555370381),
        (-28.29191520539604, 15, -74.16581108577375),
        (-36.868164355661605, 15.000000000000002, -73.496520033563),
        (-32.79142847320175, 20, -79.52812218760667),
    ]]
    fillet(fillet3_edges, radius=FILLET3_R - 0.0001)  # a hair under: the kernel refuses the full size


solid = part.part
